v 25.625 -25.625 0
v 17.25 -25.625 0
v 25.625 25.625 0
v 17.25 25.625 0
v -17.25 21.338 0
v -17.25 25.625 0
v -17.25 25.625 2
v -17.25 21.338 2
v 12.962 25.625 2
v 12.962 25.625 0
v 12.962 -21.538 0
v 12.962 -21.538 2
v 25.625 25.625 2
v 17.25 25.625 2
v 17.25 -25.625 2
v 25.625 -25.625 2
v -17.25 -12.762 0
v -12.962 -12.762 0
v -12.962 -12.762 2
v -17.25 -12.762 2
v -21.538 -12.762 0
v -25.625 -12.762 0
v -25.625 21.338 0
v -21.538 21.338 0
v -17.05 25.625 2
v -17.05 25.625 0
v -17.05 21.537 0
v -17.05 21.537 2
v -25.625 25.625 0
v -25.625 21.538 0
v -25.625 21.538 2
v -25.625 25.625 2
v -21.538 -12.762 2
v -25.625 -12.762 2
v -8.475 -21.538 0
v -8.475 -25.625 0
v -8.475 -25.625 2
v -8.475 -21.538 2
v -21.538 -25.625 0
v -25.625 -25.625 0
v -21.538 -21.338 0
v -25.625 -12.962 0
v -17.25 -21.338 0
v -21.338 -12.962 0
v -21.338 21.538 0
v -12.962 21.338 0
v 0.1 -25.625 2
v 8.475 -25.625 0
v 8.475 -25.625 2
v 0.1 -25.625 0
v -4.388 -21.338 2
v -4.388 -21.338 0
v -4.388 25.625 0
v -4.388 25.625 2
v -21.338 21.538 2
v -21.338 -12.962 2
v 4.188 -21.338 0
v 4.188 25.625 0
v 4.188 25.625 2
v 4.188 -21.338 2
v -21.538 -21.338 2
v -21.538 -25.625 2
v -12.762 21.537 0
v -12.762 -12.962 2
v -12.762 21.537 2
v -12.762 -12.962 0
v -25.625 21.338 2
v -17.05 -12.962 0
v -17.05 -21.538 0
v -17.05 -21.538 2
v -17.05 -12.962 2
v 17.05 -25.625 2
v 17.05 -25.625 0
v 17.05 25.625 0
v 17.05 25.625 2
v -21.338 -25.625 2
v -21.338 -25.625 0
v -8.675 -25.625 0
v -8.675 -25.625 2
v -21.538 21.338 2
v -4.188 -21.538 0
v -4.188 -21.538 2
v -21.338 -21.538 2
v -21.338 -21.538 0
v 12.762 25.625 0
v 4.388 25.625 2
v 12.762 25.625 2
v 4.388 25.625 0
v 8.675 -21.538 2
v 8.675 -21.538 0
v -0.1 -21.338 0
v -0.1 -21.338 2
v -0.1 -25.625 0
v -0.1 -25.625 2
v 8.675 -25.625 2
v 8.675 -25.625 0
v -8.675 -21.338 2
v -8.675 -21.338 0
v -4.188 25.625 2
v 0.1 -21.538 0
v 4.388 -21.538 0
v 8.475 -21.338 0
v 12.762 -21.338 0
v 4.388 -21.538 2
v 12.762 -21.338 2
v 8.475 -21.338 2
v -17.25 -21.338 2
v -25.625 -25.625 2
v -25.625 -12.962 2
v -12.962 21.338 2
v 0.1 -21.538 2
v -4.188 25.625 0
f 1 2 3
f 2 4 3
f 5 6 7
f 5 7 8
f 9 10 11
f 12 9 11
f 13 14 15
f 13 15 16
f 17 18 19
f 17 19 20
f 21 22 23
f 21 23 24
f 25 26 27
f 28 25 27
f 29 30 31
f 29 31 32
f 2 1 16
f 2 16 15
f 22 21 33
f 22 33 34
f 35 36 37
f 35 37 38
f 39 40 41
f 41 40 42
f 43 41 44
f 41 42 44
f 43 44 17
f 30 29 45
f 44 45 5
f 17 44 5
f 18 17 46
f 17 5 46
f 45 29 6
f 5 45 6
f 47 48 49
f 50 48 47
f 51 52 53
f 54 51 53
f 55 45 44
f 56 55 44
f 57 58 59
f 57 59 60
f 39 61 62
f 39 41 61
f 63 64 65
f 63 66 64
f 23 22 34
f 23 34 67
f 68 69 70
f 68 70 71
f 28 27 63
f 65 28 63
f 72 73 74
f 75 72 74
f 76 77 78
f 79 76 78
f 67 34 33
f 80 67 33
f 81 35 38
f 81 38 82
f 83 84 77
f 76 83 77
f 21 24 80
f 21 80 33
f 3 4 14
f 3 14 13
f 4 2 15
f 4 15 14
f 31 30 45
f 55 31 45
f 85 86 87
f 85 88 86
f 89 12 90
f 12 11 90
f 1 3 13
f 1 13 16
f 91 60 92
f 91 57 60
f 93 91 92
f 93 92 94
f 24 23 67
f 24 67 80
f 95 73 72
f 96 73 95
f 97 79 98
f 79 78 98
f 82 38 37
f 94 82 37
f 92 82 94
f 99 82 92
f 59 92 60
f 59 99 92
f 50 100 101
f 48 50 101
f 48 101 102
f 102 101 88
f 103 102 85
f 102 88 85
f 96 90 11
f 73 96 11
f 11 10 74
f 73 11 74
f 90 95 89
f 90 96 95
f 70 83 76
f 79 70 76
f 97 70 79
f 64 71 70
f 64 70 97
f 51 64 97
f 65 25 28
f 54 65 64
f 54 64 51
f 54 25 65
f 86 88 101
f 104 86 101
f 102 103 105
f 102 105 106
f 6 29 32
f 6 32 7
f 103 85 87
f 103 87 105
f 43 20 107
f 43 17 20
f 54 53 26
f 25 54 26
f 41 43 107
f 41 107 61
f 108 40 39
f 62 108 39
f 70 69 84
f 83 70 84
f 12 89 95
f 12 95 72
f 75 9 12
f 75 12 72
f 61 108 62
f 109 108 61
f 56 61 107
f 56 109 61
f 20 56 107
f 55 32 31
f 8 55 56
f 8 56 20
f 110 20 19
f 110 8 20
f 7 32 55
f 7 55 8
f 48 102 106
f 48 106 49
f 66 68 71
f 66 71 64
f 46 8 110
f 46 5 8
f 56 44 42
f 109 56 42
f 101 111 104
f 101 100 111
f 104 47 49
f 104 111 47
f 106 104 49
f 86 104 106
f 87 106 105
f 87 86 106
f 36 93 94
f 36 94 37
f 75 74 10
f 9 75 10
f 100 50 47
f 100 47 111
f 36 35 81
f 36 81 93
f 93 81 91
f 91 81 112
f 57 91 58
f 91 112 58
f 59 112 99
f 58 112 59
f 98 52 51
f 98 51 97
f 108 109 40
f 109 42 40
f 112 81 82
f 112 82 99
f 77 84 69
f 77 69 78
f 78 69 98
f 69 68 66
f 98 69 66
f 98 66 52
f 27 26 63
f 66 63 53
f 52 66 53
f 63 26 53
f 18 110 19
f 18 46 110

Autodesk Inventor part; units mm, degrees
ref_plane "YZ Plane" through (0, 0, 0) normal (1, 0, 0) x (0, 1, 0)
ref_plane "XZ Plane" through (0, 0, 0) normal (0, 1, 0) x (-1, 0, 0)
sketch "construction_sketch" plane through (0, 0, 0) normal (0, 0, 1) x (1, 0, 0)
  line L0 (25.725, 25.725) -> (-25.725, 25.725) construction
  line L1 (-25.725, 25.725) -> (-25.725, -25.725) construction
  line L2 (-25.725, -25.725) -> (25.725, -25.725) construction
  line L3 (25.725, -25.725) -> (25.725, 25.725) construction
  line L4 (25.725, -25.725) -> (17.15, -25.725) construction
  line L5 (17.15, -25.725) -> (17.15, 25.725) construction
  line L6 (17.15, 25.725) -> (25.725, 25.725) construction
  line L7 (25.725, 25.725) -> (25.725, -25.725) construction
  line L8 (17.15, 25.725) -> (12.8625, 25.725) construction
  line L9 (12.8625, 25.725) -> (12.8625, -21.4375) construction
  line L10 (17.15, -25.725) -> (17.15, 25.725) construction
  line L11 (17.15, -25.725) -> (8.575, -25.725) construction
  line L12 (8.575, -25.725) -> (8.575, -21.4375) construction
  line L13 (8.575, -21.4375) -> (12.8625, -21.4375) construction
  line L14 (12.8625, 25.725) -> (4.2875, 25.725) construction
  line L15 (4.2875, 25.725) -> (4.2875, -21.4375) construction
  line L16 (8.575, -21.4375) -> (12.8625, -21.4375) construction
  line L17 (12.8625, -21.4375) -> (12.8625, 25.725) construction
  line L18 (8.575, -25.725) -> (0, -25.725) construction
  line L19 (0, -25.725) -> (0, -21.4375) construction
  line L20 (0, -21.4375) -> (4.2875, -21.4375) construction
  line L21 (8.575, -21.4375) -> (8.575, -25.725) construction
  line L22 (4.2875, 25.725) -> (4.2875, -21.4375) construction
  line L23 (0, -25.725) -> (0, -21.4375) construction
  line L24 (0, -21.4375) -> (4.2875, -21.4375) construction
  line L25 (4.2875, 25.725) -> (-4.2875, 25.725) construction
  line L26 (-4.2875, 25.725) -> (-4.2875, -21.4375) construction
  line L27 (0, -21.4375) -> (4.2875, -21.4375) construction
  line L28 (4.2875, -21.4375) -> (4.2875, 25.725) construction
  line L29 (0, -25.725) -> (-8.575, -25.725) construction
  line L30 (-8.575, -25.725) -> (-8.575, -21.4375) construction
  line L31 (-8.575, -21.4375) -> (-4.2875, -21.4375) construction
  line L32 (0, -21.4375) -> (0, -25.725) construction
  line L33 (-4.2875, 25.725) -> (-17.15, 25.725) construction
  line L34 (-17.15, 25.725) -> (-17.15, 21.4375) construction
  line L35 (-17.15, 21.4375) -> (-12.8625, 21.4375) construction
  line L36 (-4.2875, 21.4375) -> (-4.2875, 25.725) construction
  line L37 (-4.2875, -21.4375) -> (-8.575, -21.4375) construction
  line L38 (-17.15, -21.4375) -> (-17.15, -12.8625) construction
  line L39 (-17.15, -12.8625) -> (-12.8625, -12.8625) construction
  line L40 (-4.2875, -12.8625) -> (-4.2875, -21.4375) construction
  line L41 (-12.8625, -12.8625) -> (-12.8625, 21.4375) construction
  line L42 (-4.2875, 21.4375) -> (-4.2875, -12.8625) construction
  line L43 (-17.15, -21.4375) -> (-21.4375, -21.4375) construction
  line L44 (-21.4375, -21.4375) -> (-21.4375, -25.725) construction
  line L45 (-21.4375, -25.725) -> (-8.575, -25.725) construction
  line L46 (-8.575, -25.725) -> (-8.575, -21.4375) construction
  line L47 (-25.725, -12.8625) -> (-21.4375, -12.8625) construction
  line L48 (-21.4375, -12.8625) -> (-21.4375, 21.4375) construction
  line L49 (-21.4375, 21.4375) -> (-25.725, 21.4375) construction
  line L50 (-25.725, 21.4375) -> (-25.725, -12.8625) construction
  point P0 (0, 0)
sketch "construction_sketch_2" plane through (0, 0, 0) normal (0, 0, 1) x (1, 0, 0)
  line L0 (-17.15, -12.8625) -> (-12.8625, -12.8625) construction
  line L1 (25.625, 25.625) -> (25.625, -25.625) construction
  line L2 (25.625, -25.625) -> (17.25, -25.625) construction
  line L3 (17.25, -25.625) -> (17.25, 25.625) construction
  line L4 (-8.475, -25.625) -> (-8.475, -21.5375) construction
  line L5 (-8.475, -21.5375) -> (-4.1875, -21.5375) construction
  line L6 (-4.1875, -21.5375) -> (-4.1875, 25.625) construction
  line L7 (-4.1875, 25.625) -> (4.1875, 25.625) construction
  line L8 (4.1875, 25.625) -> (4.1875, -21.3375) construction
  line L9 (4.1875, -21.3375) -> (-0.1, -21.3375) construction
  line L10 (-0.1, -21.3375) -> (-0.1, -25.625) construction
  line L11 (-0.1, -25.625) -> (-8.475, -25.625) construction
  line L12 (17.25, 25.625) -> (25.625, 25.625) construction
  line L13 (4.388, 25.625) -> (12.7625, 25.625) construction
  line L14 (12.7625, 25.625) -> (12.7625, -21.3375) construction
  line L15 (12.7625, -21.3375) -> (8.475, -21.3375) construction
  line L16 (8.475, -21.3375) -> (8.475, -25.625) construction
  line L17 (8.475, -25.625) -> (0.1, -25.625) construction
  line L18 (0.1, -25.625) -> (0.1, -21.5375) construction
  line L19 (0.1, -21.5375) -> (4.388, -21.5375) construction
  line L20 (4.388, 25.625) -> (4.388, -21.5375) construction
  line L21 (17.05, -25.625) -> (17.05, 25.625) construction
  line L22 (17.05, -25.625) -> (8.675, -25.625) construction
  line L23 (8.675, -25.625) -> (8.675, -21.5375) construction
  line L24 (17.05, 25.625) -> (12.9625, 25.625) construction
  line L25 (12.9625, 25.625) -> (12.9625, -21.5375) construction
  line L26 (12.9625, -21.5375) -> (8.675, -21.5375) construction
  line L27 (-21.3375, -25.625) -> (-8.675, -25.625) construction
  line L28 (-17.0505, -21.5375) -> (-21.3375, -21.5375) construction
  line L29 (-21.3375, -21.5375) -> (-21.3375, -25.625) construction
  line L30 (-4.3875, -21.3375) -> (-8.675, -21.3375) construction
  line L31 (-4.3875, -21.3375) -> (-4.3875, 25.625) construction
  line L32 (-8.675, -25.625) -> (-8.675, -21.3375) construction
  line L33 (-4.3875, 25.625) -> (-17.0505, 25.625) construction
  line L34 (-17.0505, 25.625) -> (-17.0505, 21.537) construction
  line L35 (-17.0505, 21.537) -> (-12.7625, 21.537) construction
  line L36 (-17.0505, -21.5375) -> (-17.0505, -12.9625) construction
  line L37 (-17.0505, -12.9625) -> (-12.7625, -12.9625) construction
  line L38 (-12.7625, -12.9625) -> (-12.7625, 21.537) construction
  line L39 (-21.5375, -12.7625) -> (-25.625, -12.7625) construction
  line L40 (-25.625, -12.7625) -> (-25.625, 21.3375) construction
  line L41 (-25.625, 21.3375) -> (-21.5375, 21.3375) construction
  line L42 (-21.5375, 21.3375) -> (-21.5375, -12.7625) construction
  line L43 (-25.625, 21.5375) -> (-25.625, 25.625) construction
  line L44 (-25.625, 25.625) -> (-17.25, 25.625) construction
  line L45 (-17.25, 25.625) -> (-17.25, 21.3375) construction
  line L46 (-17.25, 21.3375) -> (-12.9625, 21.3375) construction
  line L47 (-12.9625, 21.3375) -> (-12.9625, -12.7625) construction
  line L48 (-12.9625, -12.7625) -> (-17.25, -12.7625) construction
  line L49 (-17.25, -12.7625) -> (-17.25, -21.3375) construction
  line L50 (-17.25, -21.3375) -> (-21.5375, -21.3375) construction
  line L51 (-21.5375, -21.3375) -> (-21.5375, -25.625) construction
  line L52 (-25.625, -12.9625) -> (-25.625, -25.625) construction
  line L53 (-25.625, -25.625) -> (-21.5375, -25.625) construction
  line L54 (-21.3375, -12.9625) -> (-25.625, -12.9625) construction
  line L55 (-25.625, 21.5375) -> (-21.3375, 21.5375) construction
  line L56 (-21.3375, 21.5375) -> (-21.3375, -12.9625) construction
  point P0 (0, 0)
sketch "brick_sketch_0.1mm tolerance" plane through (0, 0, 0) normal (0, 0, 1) x (1, 0, 0)
  line L0 (-17.15, -12.8625) -> (-12.8625, -12.8625) construction
  line L1 (25.625, 25.625) -> (25.625, -25.625)
  line L2 (25.625, -25.625) -> (17.25, -25.625)
  line L3 (17.25, -25.625) -> (17.25, 25.625)
  line L4 (-8.475, -25.625) -> (-8.475, -21.5375)
  line L5 (-8.475, -21.5375) -> (-4.1875, -21.5375)
  line L6 (-4.1875, -21.5375) -> (-4.1875, 25.625)
  line L7 (-4.1875, 25.625) -> (4.1875, 25.625)
  line L8 (4.1875, 25.625) -> (4.1875, -21.3375)
  line L9 (4.1875, -21.3375) -> (-0.1, -21.3375)
  line L10 (-0.1, -21.3375) -> (-0.1, -25.625)
  line L11 (-0.1, -25.625) -> (-8.475, -25.625)
  line L12 (17.25, 25.625) -> (25.625, 25.625)
  line L13 (4.388, 25.625) -> (12.7625, 25.625)
  line L14 (12.7625, 25.625) -> (12.7625, -21.3375)
  line L15 (12.7625, -21.3375) -> (8.475, -21.3375)
  line L16 (8.475, -21.3375) -> (8.475, -25.625)
  line L17 (8.475, -25.625) -> (0.1, -25.625)
  line L18 (0.1, -25.625) -> (0.1, -21.5375)
  line L19 (0.1, -21.5375) -> (4.388, -21.5375)
  line L20 (4.388, 25.625) -> (4.388, -21.5375)
  line L21 (17.05, -25.625) -> (17.05, 25.625)
  line L22 (17.05, -25.625) -> (8.675, -25.625)
  line L23 (8.675, -25.625) -> (8.675, -21.5375)
  line L24 (17.05, 25.625) -> (12.9625, 25.625)
  line L25 (12.9625, 25.625) -> (12.9625, -21.5375)
  line L26 (12.9625, -21.5375) -> (8.675, -21.5375)
  line L27 (-21.3375, -25.625) -> (-8.675, -25.625)
  line L28 (-17.0505, -21.5375) -> (-21.3375, -21.5375)
  line L29 (-21.3375, -21.5375) -> (-21.3375, -25.625)
  line L30 (-4.3875, -21.3375) -> (-8.675, -21.3375)
  line L31 (-4.3875, -21.3375) -> (-4.3875, 25.625)
  line L32 (-8.675, -25.625) -> (-8.675, -21.3375)
  line L33 (-4.3875, 25.625) -> (-17.0505, 25.625)
  line L34 (-17.0505, 25.625) -> (-17.0505, 21.537)
  line L35 (-17.0505, 21.537) -> (-12.7625, 21.537)
  line L36 (-17.0505, -21.5375) -> (-17.0505, -12.9625)
  line L37 (-17.0505, -12.9625) -> (-12.7625, -12.9625)
  line L38 (-12.7625, -12.9625) -> (-12.7625, 21.537)
  line L39 (-21.5375, -12.7625) -> (-25.625, -12.7625)
  line L40 (-25.625, -12.7625) -> (-25.625, 21.3375)
  line L41 (-25.625, 21.3375) -> (-21.5375, 21.3375)
  line L42 (-21.5375, 21.3375) -> (-21.5375, -12.7625)
  line L43 (-25.625, 21.5375) -> (-25.625, 25.625)
  line L44 (-25.625, 25.625) -> (-17.25, 25.625)
  line L45 (-17.25, 25.625) -> (-17.25, 21.3375)
  line L46 (-17.25, 21.3375) -> (-12.9625, 21.3375)
  line L47 (-12.9625, 21.3375) -> (-12.9625, -12.7625)
  line L48 (-12.9625, -12.7625) -> (-17.25, -12.7625)
  line L49 (-17.25, -12.7625) -> (-17.25, -21.3375)
  line L50 (-17.25, -21.3375) -> (-21.5375, -21.3375)
  line L51 (-21.5375, -21.3375) -> (-21.5375, -25.625)
  line L52 (-25.625, -12.9625) -> (-25.625, -25.625)
  line L53 (-25.625, -25.625) -> (-21.5375, -25.625)
  line L54 (-21.3375, -12.9625) -> (-25.625, -12.9625)
  line L55 (-25.625, 21.5375) -> (-21.3375, 21.5375)
  line L56 (-21.3375, 21.5375) -> (-21.3375, -12.9625)
  point P0 (0, 0)
  point P1 (0, 0)
ref_plane "Work Plane1" through (0, 0, 2) normal (0, 0, 1) x (1, 0, 0)
sketch "Sketch4" plane through (0, 0, 2) normal (0, 0, 1) x (1, 0, 0)
  line L0 (25.725, 25.725) -> (-25.725, 25.725) construction
  line L1 (-25.725, 25.725) -> (-25.725, -25.725) construction
  line L2 (-25.725, -25.725) -> (25.725, -25.725) construction
  line L3 (25.725, -25.725) -> (25.725, 25.725) construction
  line L4 (25.725, -25.725) -> (21.4375, -25.725)
  line L5 (21.4375, -25.725) -> (21.4375, -21.4375)
  line L6 (21.4375, -21.4375) -> (25.725, -21.4375)
  line L7 (25.725, -21.4375) -> (25.725, -25.725)
  line L8 (21.4375, -25.725) -> (17.15, -25.725)
  line L9 (17.15, -25.725) -> (17.15, -21.4375)
  line L10 (17.15, -21.4375) -> (21.4375, -21.4375)
  line L11 (21.4375, -21.4375) -> (21.4375, -25.725)
  line L12 (17.15, -25.725) -> (12.8625, -25.725)
  line L13 (12.8625, -25.725) -> (12.8625, -21.4375)
  line L14 (12.8625, -21.4375) -> (17.15, -21.4375)
  line L15 (17.15, -21.4375) -> (17.15, -25.725)
  line L16 (12.8625, -25.725) -> (8.575, -25.725)
  line L17 (8.575, -25.725) -> (8.575, -21.4375)
  line L18 (8.575, -21.4375) -> (12.8625, -21.4375)
  line L19 (12.8625, -21.4375) -> (12.8625, -25.725)
  line L20 (8.575, -25.725) -> (4.2875, -25.725)
  line L21 (4.2875, -25.725) -> (4.2875, -21.4375)
  line L22 (4.2875, -21.4375) -> (8.575, -21.4375)
  line L23 (8.575, -21.4375) -> (8.575, -25.725)
  line L24 (4.2875, -25.725) -> (0, -25.725)
  line L25 (0, -25.725) -> (0, -21.4375)
  line L26 (0, -21.4375) -> (4.2875, -21.4375)
  line L27 (4.2875, -21.4375) -> (4.2875, -25.725)
  line L28 (0, -25.725) -> (-4.2875, -25.725)
  line L29 (-4.2875, -25.725) -> (-4.2875, -21.4375)
  line L30 (-4.2875, -21.4375) -> (0, -21.4375)
  line L31 (0, -21.4375) -> (0, -25.725)
  line L32 (-4.2875, -25.725) -> (-8.575, -25.725)
  line L33 (-8.575, -25.725) -> (-8.575, -21.4375)
  line L34 (-8.575, -21.4375) -> (-4.2875, -21.4375)
  line L35 (-4.2875, -21.4375) -> (-4.2875, -25.725)
  line L36 (-8.575, -25.725) -> (-12.8625, -25.725)
  line L37 (-12.8625, -25.725) -> (-12.8625, -21.4375)
  line L38 (-12.8625, -21.4375) -> (-8.575, -21.4375)
  line L39 (-8.575, -21.4375) -> (-8.575, -25.725)
  line L40 (-12.8625, -25.725) -> (-17.15, -25.725)
  line L41 (-17.15, -25.725) -> (-17.15, -21.4375)
  line L42 (-17.15, -21.4375) -> (-12.8625, -21.4375)
  line L43 (-12.8625, -21.4375) -> (-12.8625, -25.725)
  line L44 (-17.15, -25.725) -> (-21.4375, -25.725)
  line L45 (-21.4375, -25.725) -> (-21.4375, -21.4375)
  line L46 (-21.4375, -21.4375) -> (-17.15, -21.4375)
  line L47 (-17.15, -21.4375) -> (-17.15, -25.725)
  line L48 (-21.4375, -25.725) -> (-25.725, -25.725)
  line L49 (-25.725, -25.725) -> (-25.725, -21.4375)
  line L50 (-25.725, -21.4375) -> (-21.4375, -21.4375)
  line L51 (-21.4375, -21.4375) -> (-21.4375, -25.725)
  line L52 (25.725, -21.4375) -> (21.4375, -21.4375)
  line L53 (21.4375, -21.4375) -> (21.4375, -17.15)
  line L54 (21.4375, -17.15) -> (25.725, -17.15)
  line L55 (25.725, -17.15) -> (25.725, -21.4375)
  line L56 (21.4375, -21.4375) -> (17.15, -21.4375)
  line L57 (17.15, -21.4375) -> (17.15, -17.15)
  line L58 (17.15, -17.15) -> (21.4375, -17.15)
  line L59 (21.4375, -17.15) -> (21.4375, -21.4375)
  line L60 (17.15, -21.4375) -> (12.8625, -21.4375)
  line L61 (12.8625, -21.4375) -> (12.8625, -17.15)
  line L62 (12.8625, -17.15) -> (17.15, -17.15)
  line L63 (17.15, -17.15) -> (17.15, -21.4375)
  line L64 (12.8625, -21.4375) -> (8.575, -21.4375)
  line L65 (8.575, -21.4375) -> (8.575, -17.15)
  line L66 (8.575, -17.15) -> (12.8625, -17.15)
  line L67 (12.8625, -17.15) -> (12.8625, -21.4375)
  line L68 (8.575, -21.4375) -> (4.2875, -21.4375)
  line L69 (4.2875, -21.4375) -> (4.2875, -17.15)
  line L70 (4.2875, -17.15) -> (8.575, -17.15)
  line L71 (8.575, -17.15) -> (8.575, -21.4375)
  line L72 (4.2875, -21.4375) -> (0, -21.4375)
  line L73 (0, -21.4375) -> (0, -17.15)
  line L74 (0, -17.15) -> (4.2875, -17.15)
  line L75 (4.2875, -17.15) -> (4.2875, -21.4375)
  line L76 (0, -21.4375) -> (-4.2875, -21.4375)
  line L77 (-4.2875, -21.4375) -> (-4.2875, -17.15)
  line L78 (-4.2875, -17.15) -> (0, -17.15)
  line L79 (0, -17.15) -> (0, -21.4375)
  line L80 (-4.2875, -21.4375) -> (-8.575, -21.4375)
  line L81 (-8.575, -21.4375) -> (-8.575, -17.15)
  line L82 (-8.575, -17.15) -> (-4.2875, -17.15)
  line L83 (-4.2875, -17.15) -> (-4.2875, -21.4375)
  line L84 (-8.575, -21.4375) -> (-12.8625, -21.4375)
  line L85 (-12.8625, -21.4375) -> (-12.8625, -17.15)
  line L86 (-12.8625, -17.15) -> (-8.575, -17.15)
  line L87 (-8.575, -17.15) -> (-8.575, -21.4375)
  line L88 (-12.8625, -21.4375) -> (-17.15, -21.4375)
  line L89 (-17.15, -21.4375) -> (-17.15, -17.15)
  line L90 (-17.15, -17.15) -> (-12.8625, -17.15)
  line L91 (-12.8625, -17.15) -> (-12.8625, -21.4375)
  line L92 (-17.15, -21.4375) -> (-21.4375, -21.4375)
  line L93 (-21.4375, -21.4375) -> (-21.4375, -17.15)
  line L94 (-21.4375, -17.15) -> (-17.15, -17.15)
  line L95 (-17.15, -17.15) -> (-17.15, -21.4375)
  line L96 (-21.4375, -21.4375) -> (-25.725, -21.4375)
  line L97 (-25.725, -21.4375) -> (-25.725, -17.15)
  line L98 (-25.725, -17.15) -> (-21.4375, -17.15)
  line L99 (-21.4375, -17.15) -> (-21.4375, -21.4375)
  line L100 (25.725, -17.15) -> (21.4375, -17.15)
  line L101 (21.4375, -17.15) -> (21.4375, -12.8625)
  line L102 (21.4375, -12.8625) -> (25.725, -12.8625)
  line L103 (25.725, -12.8625) -> (25.725, -17.15)
  line L104 (21.4375, -17.15) -> (17.15, -17.15)
  line L105 (17.15, -17.15) -> (17.15, -12.8625)
  line L106 (17.15, -12.8625) -> (21.4375, -12.8625)
  line L107 (21.4375, -12.8625) -> (21.4375, -17.15)
  line L108 (17.15, -17.15) -> (12.8625, -17.15)
  line L109 (12.8625, -17.15) -> (12.8625, -12.8625)
  line L110 (12.8625, -12.8625) -> (17.15, -12.8625)
  line L111 (17.15, -12.8625) -> (17.15, -17.15)
  line L112 (12.8625, -17.15) -> (8.575, -17.15)
  line L113 (8.575, -17.15) -> (8.575, -12.8625)
  line L114 (8.575, -12.8625) -> (12.8625, -12.8625)
  line L115 (12.8625, -12.8625) -> (12.8625, -17.15)
  line L116 (8.575, -17.15) -> (4.2875, -17.15)
  line L117 (4.2875, -17.15) -> (4.2875, -12.8625)
  line L118 (4.2875, -12.8625) -> (8.575, -12.8625)
  line L119 (8.575, -12.8625) -> (8.575, -17.15)
  line L120 (4.2875, -17.15) -> (0, -17.15)
  line L121 (0, -17.15) -> (0, -12.8625)
  line L122 (0, -12.8625) -> (4.2875, -12.8625)
  line L123 (4.2875, -12.8625) -> (4.2875, -17.15)
  line L124 (0, -17.15) -> (-4.2875, -17.15)
  line L125 (-4.2875, -17.15) -> (-4.2875, -12.8625)
  line L126 (-4.2875, -12.8625) -> (0, -12.8625)
  line L127 (0, -12.8625) -> (0, -17.15)
  line L128 (-4.2875, -17.15) -> (-8.575, -17.15)
  line L129 (-8.575, -17.15) -> (-8.575, -12.8625)
  line L130 (-8.575, -12.8625) -> (-4.2875, -12.8625)
  line L131 (-4.2875, -12.8625) -> (-4.2875, -17.15)
  line L132 (-8.575, -17.15) -> (-12.8625, -17.15)
  line L133 (-12.8625, -17.15) -> (-12.8625, -12.8625)
  line L134 (-12.8625, -12.8625) -> (-8.575, -12.8625)
  line L135 (-8.575, -12.8625) -> (-8.575, -17.15)
  line L136 (-12.8625, -17.15) -> (-17.15, -17.15)
  line L137 (-17.15, -17.15) -> (-17.15, -12.8625)
  line L138 (-17.15, -12.8625) -> (-12.8625, -12.8625)
  line L139 (-12.8625, -12.8625) -> (-12.8625, -17.15)
  line L140 (-17.15, -17.15) -> (-21.4375, -17.15)
  line L141 (-21.4375, -17.15) -> (-21.4375, -12.8625)
  line L142 (-21.4375, -12.8625) -> (-17.15, -12.8625)
  line L143 (-17.15, -12.8625) -> (-17.15, -17.15)
  line L144 (-21.4375, -17.15) -> (-25.725, -17.15)
  line L145 (-25.725, -17.15) -> (-25.725, -12.8625)
  line L146 (-25.725, -12.8625) -> (-21.4375, -12.8625)
  line L147 (-21.4375, -12.8625) -> (-21.4375, -17.15)
  line L148 (25.725, -12.8625) -> (21.4375, -12.8625)
  line L149 (21.4375, -12.8625) -> (21.4375, -8.575)
  line L150 (21.4375, -8.575) -> (25.725, -8.575)
  line L151 (25.725, -8.575) -> (25.725, -12.8625)
  line L152 (21.4375, -12.8625) -> (17.15, -12.8625)
  line L153 (17.15, -12.8625) -> (17.15, -8.575)
  line L154 (17.15, -8.575) -> (21.4375, -8.575)
  line L155 (21.4375, -8.575) -> (21.4375, -12.8625)
  line L156 (17.15, -12.8625) -> (12.8625, -12.8625)
  line L157 (12.8625, -12.8625) -> (12.8625, -8.575)
  line L158 (12.8625, -8.575) -> (17.15, -8.575)
  line L159 (17.15, -8.575) -> (17.15, -12.8625)
  line L160 (12.8625, -12.8625) -> (8.575, -12.8625)
  line L161 (8.575, -12.8625) -> (8.575, -8.575)
  line L162 (8.575, -8.575) -> (12.8625, -8.575)
  line L163 (12.8625, -8.575) -> (12.8625, -12.8625)
  line L164 (8.575, -12.8625) -> (4.2875, -12.8625)
  line L165 (4.2875, -12.8625) -> (4.2875, -8.575)
  line L166 (4.2875, -8.575) -> (8.575, -8.575)
  line L167 (8.575, -8.575) -> (8.575, -12.8625)
  line L168 (4.2875, -12.8625) -> (0, -12.8625)
  line L169 (0, -12.8625) -> (0, -8.575)
  line L170 (0, -8.575) -> (4.2875, -8.575)
  line L171 (4.2875, -8.575) -> (4.2875, -12.8625)
  line L172 (0, -12.8625) -> (-4.2875, -12.8625)
  line L173 (-4.2875, -12.8625) -> (-4.2875, -8.575)
  line L174 (-4.2875, -8.575) -> (0, -8.575)
  line L175 (0, -8.575) -> (0, -12.8625)
  line L176 (-4.2875, -12.8625) -> (-8.575, -12.8625)
  line L177 (-8.575, -12.8625) -> (-8.575, -8.575)
  line L178 (-8.575, -8.575) -> (-4.2875, -8.575)
  line L179 (-4.2875, -8.575) -> (-4.2875, -12.8625)
  line L180 (-8.575, -12.8625) -> (-12.8625, -12.8625)
  line L181 (-12.8625, -12.8625) -> (-12.8625, -8.575)
  line L182 (-12.8625, -8.575) -> (-8.575, -8.575)
  line L183 (-8.575, -8.575) -> (-8.575, -12.8625)
  line L184 (-12.8625, -12.8625) -> (-17.15, -12.8625)
  line L185 (-17.15, -12.8625) -> (-17.15, -8.575)
  line L186 (-17.15, -8.575) -> (-12.8625, -8.575)
  line L187 (-12.8625, -8.575) -> (-12.8625, -12.8625)
  line L188 (-17.15, -12.8625) -> (-21.4375, -12.8625)
  line L189 (-21.4375, -12.8625) -> (-21.4375, -8.575)
  line L190 (-21.4375, -8.575) -> (-17.15, -8.575)
  line L191 (-17.15, -8.575) -> (-17.15, -12.8625)
  line L192 (-21.4375, -12.8625) -> (-25.725, -12.8625)
  line L193 (-25.725, -12.8625) -> (-25.725, -8.575)
  line L194 (-25.725, -8.575) -> (-21.4375, -8.575)
  line L195 (-21.4375, -8.575) -> (-21.4375, -12.8625)
  line L196 (25.725, -8.575) -> (21.4375, -8.575)
  line L197 (21.4375, -8.575) -> (21.4375, -4.2875)
  line L198 (21.4375, -4.2875) -> (25.725, -4.2875)
  line L199 (25.725, -4.2875) -> (25.725, -8.575)
  line L200 (21.4375, -8.575) -> (17.15, -8.575)
  line L201 (17.15, -8.575) -> (17.15, -4.2875)
  line L202 (17.15, -4.2875) -> (21.4375, -4.2875)
  line L203 (21.4375, -4.2875) -> (21.4375, -8.575)
  line L204 (17.15, -8.575) -> (12.8625, -8.575)
  line L205 (12.8625, -8.575) -> (12.8625, -4.2875)
  line L206 (12.8625, -4.2875) -> (17.15, -4.2875)
  line L207 (17.15, -4.2875) -> (17.15, -8.575)
  line L208 (12.8625, -8.575) -> (8.575, -8.575)
  line L209 (8.575, -8.575) -> (8.575, -4.2875)
  line L210 (8.575, -4.2875) -> (12.8625, -4.2875)
  line L211 (12.8625, -4.2875) -> (12.8625, -8.575)
  line L212 (8.575, -8.575) -> (4.2875, -8.575)
  line L213 (4.2875, -8.575) -> (4.2875, -4.2875)
  line L214 (4.2875, -4.2875) -> (8.575, -4.2875)
  line L215 (8.575, -4.2875) -> (8.575, -8.575)
  line L216 (4.2875, -8.575) -> (0, -8.575)
  line L217 (0, -8.575) -> (0, -4.2875)
  line L218 (0, -4.2875) -> (4.2875, -4.2875)
  line L219 (4.2875, -4.2875) -> (4.2875, -8.575)
  line L220 (0, -8.575) -> (-4.2875, -8.575)
  line L221 (-4.2875, -8.575) -> (-4.2875, -4.2875)
  line L222 (-4.2875, -4.2875) -> (0, -4.2875)
  line L223 (0, -4.2875) -> (0, -8.575)
  line L224 (-4.2875, -8.575) -> (-8.575, -8.575)
  line L225 (-8.575, -8.575) -> (-8.575, -4.2875)
  line L226 (-8.575, -4.2875) -> (-4.2875, -4.2875)
  line L227 (-4.2875, -4.2875) -> (-4.2875, -8.575)
  line L228 (-8.575, -8.575) -> (-12.8625, -8.575)
  line L229 (-12.8625, -8.575) -> (-12.8625, -4.2875)
  line L230 (-12.8625, -4.2875) -> (-8.575, -4.2875)
  line L231 (-8.575, -4.2875) -> (-8.575, -8.575)
  line L232 (-12.8625, -8.575) -> (-17.15, -8.575)
  line L233 (-17.15, -8.575) -> (-17.15, -4.2875)
  line L234 (-17.15, -4.2875) -> (-12.8625, -4.2875)
  line L235 (-12.8625, -4.2875) -> (-12.8625, -8.575)
  line L236 (-17.15, -8.575) -> (-21.4375, -8.575)
  line L237 (-21.4375, -8.575) -> (-21.4375, -4.2875)
  line L238 (-21.4375, -4.2875) -> (-17.15, -4.2875)
  line L239 (-17.15, -4.2875) -> (-17.15, -8.575)
  line L240 (-21.4375, -8.575) -> (-25.725, -8.575)
  line L241 (-25.725, -8.575) -> (-25.725, -4.2875)
  line L242 (-25.725, -4.2875) -> (-21.4375, -4.2875)
  line L243 (-21.4375, -4.2875) -> (-21.4375, -8.575)
  line L244 (25.725, -4.2875) -> (21.4375, -4.2875)
  line L245 (21.4375, -4.2875) -> (21.4375, 0)
  line L246 (21.4375, 0) -> (25.725, 0)
  line L247 (25.725, 0) -> (25.725, -4.2875)
  line L248 (21.4375, -4.2875) -> (17.15, -4.2875)
  line L249 (17.15, -4.2875) -> (17.15, 0)
  line L250 (17.15, 0) -> (21.4375, 0)
  line L251 (21.4375, 0) -> (21.4375, -4.2875)
  line L252 (17.15, -4.2875) -> (12.8625, -4.2875)
  line L253 (12.8625, -4.2875) -> (12.8625, 0)
  line L254 (12.8625, 0) -> (17.15, 0)
  line L255 (17.15, 0) -> (17.15, -4.2875)
  line L256 (12.8625, -4.2875) -> (8.575, -4.2875)
  line L257 (8.575, -4.2875) -> (8.575, 0)
  line L258 (8.575, 0) -> (12.8625, 0)
  line L259 (12.8625, 0) -> (12.8625, -4.2875)
  line L260 (8.575, -4.2875) -> (4.2875, -4.2875)
  line L261 (4.2875, -4.2875) -> (4.2875, 0)
  line L262 (4.2875, 0) -> (8.575, 0)
  line L263 (8.575, 0) -> (8.575, -4.2875)
  line L264 (4.2875, -4.2875) -> (0, -4.2875)
  line L265 (0, -4.2875) -> (0, 0)
  line L266 (0, 0) -> (4.2875, 0)
  line L267 (4.2875, 0) -> (4.2875, -4.2875)
  line L268 (0, -4.2875) -> (-4.2875, -4.2875)
  line L269 (-4.2875, -4.2875) -> (-4.2875, 0)
  line L270 (-4.2875, 0) -> (0, 0)
  line L271 (0, 0) -> (0, -4.2875)
  line L272 (-4.2875, -4.2875) -> (-8.575, -4.2875)
  line L273 (-8.575, -4.2875) -> (-8.575, 0)
  line L274 (-8.575, 0) -> (-4.2875, 0)
  line L275 (-4.2875, 0) -> (-4.2875, -4.2875)
  line L276 (-8.575, -4.2875) -> (-12.8625, -4.2875)
  line L277 (-12.8625, -4.2875) -> (-12.8625, 0)
  line L278 (-12.8625, 0) -> (-8.575, 0)
  line L279 (-8.575, 0) -> (-8.575, -4.2875)
  line L280 (-12.8625, -4.2875) -> (-17.15, -4.2875)
  line L281 (-17.15, -4.2875) -> (-17.15, 0)
  line L282 (-17.15, 0) -> (-12.8625, 0)
  line L283 (-12.8625, 0) -> (-12.8625, -4.2875)
  line L284 (-17.15, -4.2875) -> (-21.4375, -4.2875)
  line L285 (-21.4375, -4.2875) -> (-21.4375, 0)
  line L286 (-21.4375, 0) -> (-17.15, 0)
  line L287 (-17.15, 0) -> (-17.15, -4.2875)
  line L288 (-21.4375, -4.2875) -> (-25.725, -4.2875)
  line L289 (-25.725, -4.2875) -> (-25.725, 0)
  line L290 (-25.725, 0) -> (-21.4375, 0)
  line L291 (-21.4375, 0) -> (-21.4375, -4.2875)
  line L292 (25.725, 0) -> (21.4375, 0)
  line L293 (21.4375, 0) -> (21.4375, 4.2875)
  line L294 (21.4375, 4.2875) -> (25.725, 4.2875)
  line L295 (25.725, 4.2875) -> (25.725, 0)
  line L296 (21.4375, 0) -> (17.15, 0)
  line L297 (17.15, 0) -> (17.15, 4.2875)
  line L298 (17.15, 4.2875) -> (21.4375, 4.2875)
  line L299 (21.4375, 4.2875) -> (21.4375, 0)
  line L300 (17.15, 0) -> (12.8625, 0)
  line L301 (12.8625, 0) -> (12.8625, 4.2875)
  line L302 (12.8625, 4.2875) -> (17.15, 4.2875)
  line L303 (17.15, 4.2875) -> (17.15, 0)
  line L304 (12.8625, 0) -> (8.575, 0)
  line L305 (8.575, 0) -> (8.575, 4.2875)
  line L306 (8.575, 4.2875) -> (12.8625, 4.2875)
  line L307 (12.8625, 4.2875) -> (12.8625, 0)
  line L308 (8.575, 0) -> (4.2875, 0)
  line L309 (4.2875, 0) -> (4.2875, 4.2875)
  line L310 (4.2875, 4.2875) -> (8.575, 4.2875)
  line L311 (8.575, 4.2875) -> (8.575, 0)
  line L312 (4.2875, 0) -> (0, 0)
  line L313 (0, 0) -> (0, 4.2875)
  line L314 (0, 4.2875) -> (4.2875, 4.2875)
  line L315 (4.2875, 4.2875) -> (4.2875, 0)
  line L316 (0, 0) -> (-4.2875, 0)
  line L317 (-4.2875, 0) -> (-4.2875, 4.2875)
  line L318 (-4.2875, 4.2875) -> (0, 4.2875)
  line L319 (0, 4.2875) -> (0, 0)
  line L320 (-4.2875, 0) -> (-8.575, 0)
  line L321 (-8.575, 0) -> (-8.575, 4.2875)
  line L322 (-8.575, 4.2875) -> (-4.2875, 4.2875)
  line L323 (-4.2875, 4.2875) -> (-4.2875, 0)
  line L324 (-8.575, 0) -> (-12.8625, 0)
  line L325 (-12.8625, 0) -> (-12.8625, 4.2875)
  line L326 (-12.8625, 4.2875) -> (-8.575, 4.2875)
  line L327 (-8.575, 4.2875) -> (-8.575, 0)
  line L328 (-12.8625, 0) -> (-17.15, 0)
  line L329 (-17.15, 0) -> (-17.15, 4.2875)
  line L330 (-17.15, 4.2875) -> (-12.8625, 4.2875)
  line L331 (-12.8625, 4.2875) -> (-12.8625, 0)
  line L332 (-17.15, 0) -> (-21.4375, 0)
  line L333 (-21.4375, 0) -> (-21.4375, 4.2875)
  line L334 (-21.4375, 4.2875) -> (-17.15, 4.2875)
  line L335 (-17.15, 4.2875) -> (-17.15, 0)
  line L336 (-21.4375, 0) -> (-25.725, 0)
  line L337 (-25.725, 0) -> (-25.725, 4.2875)
  line L338 (-25.725, 4.2875) -> (-21.4375, 4.2875)
  line L339 (-21.4375, 4.2875) -> (-21.4375, 0)
  line L340 (25.725, 4.2875) -> (21.4375, 4.2875)
  line L341 (21.4375, 4.2875) -> (21.4375, 8.575)
  line L342 (21.4375, 8.575) -> (25.725, 8.575)
  line L343 (25.725, 8.575) -> (25.725, 4.2875)
  line L344 (21.4375, 4.2875) -> (17.15, 4.2875)
  line L345 (17.15, 4.2875) -> (17.15, 8.575)
  line L346 (17.15, 8.575) -> (21.4375, 8.575)
  line L347 (21.4375, 8.575) -> (21.4375, 4.2875)
  line L348 (17.15, 4.2875) -> (12.8625, 4.2875)
  line L349 (12.8625, 4.2875) -> (12.8625, 8.575)
  line L350 (12.8625, 8.575) -> (17.15, 8.575)
  line L351 (17.15, 8.575) -> (17.15, 4.2875)
  line L352 (12.8625, 4.2875) -> (8.575, 4.2875)
  line L353 (8.575, 4.2875) -> (8.575, 8.575)
  line L354 (8.575, 8.575) -> (12.8625, 8.575)
  line L355 (12.8625, 8.575) -> (12.8625, 4.2875)
  line L356 (8.575, 4.2875) -> (4.2875, 4.2875)
  line L357 (4.2875, 4.2875) -> (4.2875, 8.575)
  line L358 (4.2875, 8.575) -> (8.575, 8.575)
  line L359 (8.575, 8.575) -> (8.575, 4.2875)
  line L360 (4.2875, 4.2875) -> (0, 4.2875)
  line L361 (0, 4.2875) -> (0, 8.575)
  line L362 (0, 8.575) -> (4.2875, 8.575)
  line L363 (4.2875, 8.575) -> (4.2875, 4.2875)
  line L364 (0, 4.2875) -> (-4.2875, 4.2875)
  line L365 (-4.2875, 4.2875) -> (-4.2875, 8.575)
  line L366 (-4.2875, 8.575) -> (0, 8.575)
  line L367 (0, 8.575) -> (0, 4.2875)
  line L368 (-4.2875, 4.2875) -> (-8.575, 4.2875)
  line L369 (-8.575, 4.2875) -> (-8.575, 8.575)
  line L370 (-8.575, 8.575) -> (-4.2875, 8.575)
  line L371 (-4.2875, 8.575) -> (-4.2875, 4.2875)
  line L372 (-8.575, 4.2875) -> (-12.8625, 4.2875)
  line L373 (-12.8625, 4.2875) -> (-12.8625, 8.575)
  line L374 (-12.8625, 8.575) -> (-8.575, 8.575)
  line L375 (-8.575, 8.575) -> (-8.575, 4.2875)
  line L376 (-12.8625, 4.2875) -> (-17.15, 4.2875)
  line L377 (-17.15, 4.2875) -> (-17.15, 8.575)
  line L378 (-17.15, 8.575) -> (-12.8625, 8.575)
  line L379 (-12.8625, 8.575) -> (-12.8625, 4.2875)
  line L380 (-17.15, 4.2875) -> (-21.4375, 4.2875)
  line L381 (-21.4375, 4.2875) -> (-21.4375, 8.575)
  line L382 (-21.4375, 8.575) -> (-17.15, 8.575)
  line L383 (-17.15, 8.575) -> (-17.15, 4.2875)
  line L384 (-21.4375, 4.2875) -> (-25.725, 4.2875)
  line L385 (-25.725, 4.2875) -> (-25.725, 8.575)
  line L386 (-25.725, 8.575) -> (-21.4375, 8.575)
  line L387 (-21.4375, 8.575) -> (-21.4375, 4.2875)
  line L388 (25.725, 8.575) -> (21.4375, 8.575)
  line L389 (21.4375, 8.575) -> (21.4375, 12.8625)
  line L390 (21.4375, 12.8625) -> (25.725, 12.8625)
  line L391 (25.725, 12.8625) -> (25.725, 8.575)
  line L392 (21.4375, 8.575) -> (17.15, 8.575)
  line L393 (17.15, 8.575) -> (17.15, 12.8625)
  line L394 (17.15, 12.8625) -> (21.4375, 12.8625)
  line L395 (21.4375, 12.8625) -> (21.4375, 8.575)
  line L396 (17.15, 8.575) -> (12.8625, 8.575)
  line L397 (12.8625, 8.575) -> (12.8625, 12.8625)
  line L398 (12.8625, 12.8625) -> (17.15, 12.8625)
  line L399 (17.15, 12.8625) -> (17.15, 8.575)
  line L400 (12.8625, 8.575) -> (8.575, 8.575)
  line L401 (8.575, 8.575) -> (8.575, 12.8625)
  line L402 (8.575, 12.8625) -> (12.8625, 12.8625)
  line L403 (12.8625, 12.8625) -> (12.8625, 8.575)
  line L404 (8.575, 8.575) -> (4.2875, 8.575)
  line L405 (4.2875, 8.575) -> (4.2875, 12.8625)
  line L406 (4.2875, 12.8625) -> (8.575, 12.8625)
  line L407 (8.575, 12.8625) -> (8.575, 8.575)
  line L408 (4.2875, 8.575) -> (0, 8.575)
  line L409 (0, 8.575) -> (0, 12.8625)
  line L410 (0, 12.8625) -> (4.2875, 12.8625)
  line L411 (4.2875, 12.8625) -> (4.2875, 8.575)
  line L412 (0, 8.575) -> (-4.2875, 8.575)
  line L413 (-4.2875, 8.575) -> (-4.2875, 12.8625)
  line L414 (-4.2875, 12.8625) -> (0, 12.8625)
  line L415 (0, 12.8625) -> (0, 8.575)
  line L416 (-4.2875, 8.575) -> (-8.575, 8.575)
  line L417 (-8.575, 8.575) -> (-8.575, 12.8625)
  line L418 (-8.575, 12.8625) -> (-4.2875, 12.8625)
  line L419 (-4.2875, 12.8625) -> (-4.2875, 8.575)
  line L420 (-8.575, 8.575) -> (-12.8625, 8.575)
  line L421 (-12.8625, 8.575) -> (-12.8625, 12.8625)
  line L422 (-12.8625, 12.8625) -> (-8.575, 12.8625)
  line L423 (-8.575, 12.8625) -> (-8.575, 8.575)
  line L424 (-12.8625, 8.575) -> (-17.15, 8.575)
  line L425 (-17.15, 8.575) -> (-17.15, 12.8625)
  line L426 (-17.15, 12.8625) -> (-12.8625, 12.8625)
  line L427 (-12.8625, 12.8625) -> (-12.8625, 8.575)
  line L428 (-17.15, 8.575) -> (-21.4375, 8.575)
  line L429 (-21.4375, 8.575) -> (-21.4375, 12.8625)
  line L430 (-21.4375, 12.8625) -> (-17.15, 12.8625)
  line L431 (-17.15, 12.8625) -> (-17.15, 8.575)
  line L432 (-21.4375, 8.575) -> (-25.725, 8.575)
  line L433 (-25.725, 8.575) -> (-25.725, 12.8625)
  line L434 (-25.725, 12.8625) -> (-21.4375, 12.8625)
  line L435 (-21.4375, 12.8625) -> (-21.4375, 8.575)
  line L436 (25.725, 12.8625) -> (21.4375, 12.8625)
  line L437 (21.4375, 12.8625) -> (21.4375, 17.15)
  line L438 (21.4375, 17.15) -> (25.725, 17.15)
  line L439 (25.725, 17.15) -> (25.725, 12.8625)
  line L440 (21.4375, 12.8625) -> (17.15, 12.8625)
  line L441 (17.15, 12.8625) -> (17.15, 17.15)
  line L442 (17.15, 17.15) -> (21.4375, 17.15)
  line L443 (21.4375, 17.15) -> (21.4375, 12.8625)
  line L444 (17.15, 12.8625) -> (12.8625, 12.8625)
  line L445 (12.8625, 12.8625) -> (12.8625, 17.15)
  line L446 (12.8625, 17.15) -> (17.15, 17.15)
  line L447 (17.15, 17.15) -> (17.15, 12.8625)
  line L448 (12.8625, 12.8625) -> (8.575, 12.8625)
  line L449 (8.575, 12.8625) -> (8.575, 17.15)
  line L450 (8.575, 17.15) -> (12.8625, 17.15)
  line L451 (12.8625, 17.15) -> (12.8625, 12.8625)
  line L452 (8.575, 12.8625) -> (4.2875, 12.8625)
  line L453 (4.2875, 12.8625) -> (4.2875, 17.15)
  line L454 (4.2875, 17.15) -> (8.575, 17.15)
  line L455 (8.575, 17.15) -> (8.575, 12.8625)
  line L456 (4.2875, 12.8625) -> (0, 12.8625)
  line L457 (0, 12.8625) -> (0, 17.15)
  line L458 (0, 17.15) -> (4.2875, 17.15)
  line L459 (4.2875, 17.15) -> (4.2875, 12.8625)
  line L460 (0, 12.8625) -> (-4.2875, 12.8625)
  line L461 (-4.2875, 12.8625) -> (-4.2875, 17.15)
  line L462 (-4.2875, 17.15) -> (0, 17.15)
  line L463 (0, 17.15) -> (0, 12.8625)
  line L464 (-4.2875, 12.8625) -> (-8.575, 12.8625)
  line L465 (-8.575, 12.8625) -> (-8.575, 17.15)
  line L466 (-8.575, 17.15) -> (-4.2875, 17.15)
  line L467 (-4.2875, 17.15) -> (-4.2875, 12.8625)
  line L468 (-8.575, 12.8625) -> (-12.8625, 12.8625)
  line L469 (-12.8625, 12.8625) -> (-12.8625, 17.15)
  line L470 (-12.8625, 17.15) -> (-8.575, 17.15)
  line L471 (-8.575, 17.15) -> (-8.575, 12.8625)
  line L472 (-12.8625, 12.8625) -> (-17.15, 12.8625)
  line L473 (-17.15, 12.8625) -> (-17.15, 17.15)
  line L474 (-17.15, 17.15) -> (-12.8625, 17.15)
  line L475 (-12.8625, 17.15) -> (-12.8625, 12.8625)
  line L476 (-17.15, 12.8625) -> (-21.4375, 12.8625)
  line L477 (-21.4375, 12.8625) -> (-21.4375, 17.15)
  line L478 (-21.4375, 17.15) -> (-17.15, 17.15)
  line L479 (-17.15, 17.15) -> (-17.15, 12.8625)
  line L480 (-21.4375, 12.8625) -> (-25.725, 12.8625)
  line L481 (-25.725, 12.8625) -> (-25.725, 17.15)
  line L482 (-25.725, 17.15) -> (-21.4375, 17.15)
  line L483 (-21.4375, 17.15) -> (-21.4375, 12.8625)
  line L484 (25.725, 17.15) -> (21.4375, 17.15)
  line L485 (21.4375, 17.15) -> (21.4375, 21.4375)
  line L486 (21.4375, 21.4375) -> (25.725, 21.4375)
  line L487 (25.725, 21.4375) -> (25.725, 17.15)
  line L488 (21.4375, 17.15) -> (17.15, 17.15)
  line L489 (17.15, 17.15) -> (17.15, 21.4375)
  line L490 (17.15, 21.4375) -> (21.4375, 21.4375)
  line L491 (21.4375, 21.4375) -> (21.4375, 17.15)
  line L492 (17.15, 17.15) -> (12.8625, 17.15)
  line L493 (12.8625, 17.15) -> (12.8625, 21.4375)
  line L494 (12.8625, 21.4375) -> (17.15, 21.4375)
  line L495 (17.15, 21.4375) -> (17.15, 17.15)
  line L496 (12.8625, 17.15) -> (8.575, 17.15)
  line L497 (8.575, 17.15) -> (8.575, 21.4375)
  line L498 (8.575, 21.4375) -> (12.8625, 21.4375)
  line L499 (12.8625, 21.4375) -> (12.8625, 17.15)
  line L500 (8.575, 17.15) -> (4.2875, 17.15)
  line L501 (4.2875, 17.15) -> (4.2875, 21.4375)
  line L502 (4.2875, 21.4375) -> (8.575, 21.4375)
  line L503 (8.575, 21.4375) -> (8.575, 17.15)
  line L504 (4.2875, 17.15) -> (0, 17.15)
  line L505 (0, 17.15) -> (0, 21.4375)
  line L506 (0, 21.4375) -> (4.2875, 21.4375)
  line L507 (4.2875, 21.4375) -> (4.2875, 17.15)
  line L508 (0, 17.15) -> (-4.2875, 17.15)
  line L509 (-4.2875, 17.15) -> (-4.2875, 21.4375)
  line L510 (-4.2875, 21.4375) -> (0, 21.4375)
  line L511 (0, 21.4375) -> (0, 17.15)
  line L512 (-4.2875, 17.15) -> (-8.575, 17.15)
  line L513 (-8.575, 17.15) -> (-8.575, 21.4375)
  line L514 (-8.575, 21.4375) -> (-4.2875, 21.4375)
  line L515 (-4.2875, 21.4375) -> (-4.2875, 17.15)
  line L516 (-8.575, 17.15) -> (-12.8625, 17.15)
  line L517 (-12.8625, 17.15) -> (-12.8625, 21.4375)
  line L518 (-12.8625, 21.4375) -> (-8.575, 21.4375)
  line L519 (-8.575, 21.4375) -> (-8.575, 17.15)
  line L520 (-12.8625, 17.15) -> (-17.15, 17.15)
  line L521 (-17.15, 17.15) -> (-17.15, 21.4375)
  line L522 (-17.15, 21.4375) -> (-12.8625, 21.4375)
  line L523 (-12.8625, 21.4375) -> (-12.8625, 17.15)
  line L524 (-17.15, 17.15) -> (-21.4375, 17.15)
  line L525 (-21.4375, 17.15) -> (-21.4375, 21.4375)
  line L526 (-21.4375, 21.4375) -> (-17.15, 21.4375)
  line L527 (-17.15, 21.4375) -> (-17.15, 17.15)
  line L528 (-21.4375, 17.15) -> (-25.725, 17.15)
  line L529 (-25.725, 17.15) -> (-25.725, 21.4375)
  line L530 (-25.725, 21.4375) -> (-21.4375, 21.4375)
  line L531 (-21.4375, 21.4375) -> (-21.4375, 17.15)
  line L532 (25.725, 21.4375) -> (21.4375, 21.4375)
  line L533 (21.4375, 21.4375) -> (21.4375, 25.725)
  line L534 (21.4375, 25.725) -> (25.725, 25.725)
  line L535 (25.725, 25.725) -> (25.725, 21.4375)
  line L536 (21.4375, 21.4375) -> (17.15, 21.4375)
  line L537 (17.15, 21.4375) -> (17.15, 25.725)
  line L538 (17.15, 25.725) -> (21.4375, 25.725)
  line L539 (21.4375, 25.725) -> (21.4375, 21.4375)
  line L540 (17.15, 21.4375) -> (12.8625, 21.4375)
  line L541 (12.8625, 21.4375) -> (12.8625, 25.725)
  line L542 (12.8625, 25.725) -> (17.15, 25.725)
  line L543 (17.15, 25.725) -> (17.15, 21.4375)
  line L544 (12.8625, 21.4375) -> (8.575, 21.4375)
  line L545 (8.575, 21.4375) -> (8.575, 25.725)
  line L546 (8.575, 25.725) -> (12.8625, 25.725)
  line L547 (12.8625, 25.725) -> (12.8625, 21.4375)
  line L548 (8.575, 21.4375) -> (4.2875, 21.4375)
  line L549 (4.2875, 21.4375) -> (4.2875, 25.725)
  line L550 (4.2875, 25.725) -> (8.575, 25.725)
  line L551 (8.575, 25.725) -> (8.575, 21.4375)
  line L552 (4.2875, 21.4375) -> (0, 21.4375)
  line L553 (0, 21.4375) -> (0, 25.725)
  line L554 (0, 25.725) -> (4.2875, 25.725)
  line L555 (4.2875, 25.725) -> (4.2875, 21.4375)
  line L556 (0, 21.4375) -> (-4.2875, 21.4375)
  line L557 (-4.2875, 21.4375) -> (-4.2875, 25.725)
  line L558 (-4.2875, 25.725) -> (0, 25.725)
  line L559 (0, 25.725) -> (0, 21.4375)
  line L560 (-4.2875, 21.4375) -> (-8.575, 21.4375)
  line L561 (-8.575, 21.4375) -> (-8.575, 25.725)
  line L562 (-8.575, 25.725) -> (-4.2875, 25.725)
  line L563 (-4.2875, 25.725) -> (-4.2875, 21.4375)
  line L564 (-8.575, 21.4375) -> (-12.8625, 21.4375)
  line L565 (-12.8625, 21.4375) -> (-12.8625, 25.725)
  line L566 (-12.8625, 25.725) -> (-8.575, 25.725)
  line L567 (-8.575, 25.725) -> (-8.575, 21.4375)
  line L568 (-12.8625, 21.4375) -> (-17.15, 21.4375)
  line L569 (-17.15, 21.4375) -> (-17.15, 25.725)
  line L570 (-17.15, 25.725) -> (-12.8625, 25.725)
  line L571 (-12.8625, 25.725) -> (-12.8625, 21.4375)
  line L572 (-17.15, 21.4375) -> (-21.4375, 21.4375)
  line L573 (-21.4375, 21.4375) -> (-21.4375, 25.725)
  line L574 (-21.4375, 25.725) -> (-17.15, 25.725)
  line L575 (-17.15, 25.725) -> (-17.15, 21.4375)
  line L576 (-21.4375, 21.4375) -> (-25.725, 21.4375)
  line L577 (-25.725, 21.4375) -> (-25.725, 25.725)
  line L578 (-25.725, 25.725) -> (-21.4375, 25.725)
  line L579 (-21.4375, 25.725) -> (-21.4375, 21.4375)
  point P0 (0, 0)
  dimension "d45" = 51.45
  dimension "d46" = 51.45
  dimension "d51" = 4.2875
  dimension "d54" = 4.2875
extrude "Segment_1" add sketch "brick_sketch_0.1mm tolerance" along normal blind 2 contours L22 L23 L26 L25 L24 L21
extrude "Segment_2" add sketch "brick_sketch_0.1mm tolerance" along normal blind 2 separate body contours L39 L40 L41 L42
extrude "Segment_3" add sketch "brick_sketch_0.1mm tolerance" along normal blind 2 separate body contours L1 L2 L3 L12
extrude "Segment_4" add sketch "brick_sketch_0.1mm tolerance" along normal blind 2 separate body contours L43 L44 L45 L46 L47 L48 L49 L50 L51 L53 L52 L54 L56 L55
extrude "Segment_5" add sketch "brick_sketch_0.1mm tolerance" along normal blind 2 separate body contours L13 L14 L15 L16 L17 L18 L19 L20
extrude "Segment_6" add sketch "brick_sketch_0.1mm tolerance" along normal blind 2 separate body contours L4 L5 L6 L7 L8 L9 L10 L11
extrude "Segment_7" add sketch "brick_sketch_0.1mm tolerance" along normal blind 2 separate body contours L29 L28 L36 L37 L38 L35 L34 L33 L31 L30 L32 L27
properties part number "reflector_sketch"
